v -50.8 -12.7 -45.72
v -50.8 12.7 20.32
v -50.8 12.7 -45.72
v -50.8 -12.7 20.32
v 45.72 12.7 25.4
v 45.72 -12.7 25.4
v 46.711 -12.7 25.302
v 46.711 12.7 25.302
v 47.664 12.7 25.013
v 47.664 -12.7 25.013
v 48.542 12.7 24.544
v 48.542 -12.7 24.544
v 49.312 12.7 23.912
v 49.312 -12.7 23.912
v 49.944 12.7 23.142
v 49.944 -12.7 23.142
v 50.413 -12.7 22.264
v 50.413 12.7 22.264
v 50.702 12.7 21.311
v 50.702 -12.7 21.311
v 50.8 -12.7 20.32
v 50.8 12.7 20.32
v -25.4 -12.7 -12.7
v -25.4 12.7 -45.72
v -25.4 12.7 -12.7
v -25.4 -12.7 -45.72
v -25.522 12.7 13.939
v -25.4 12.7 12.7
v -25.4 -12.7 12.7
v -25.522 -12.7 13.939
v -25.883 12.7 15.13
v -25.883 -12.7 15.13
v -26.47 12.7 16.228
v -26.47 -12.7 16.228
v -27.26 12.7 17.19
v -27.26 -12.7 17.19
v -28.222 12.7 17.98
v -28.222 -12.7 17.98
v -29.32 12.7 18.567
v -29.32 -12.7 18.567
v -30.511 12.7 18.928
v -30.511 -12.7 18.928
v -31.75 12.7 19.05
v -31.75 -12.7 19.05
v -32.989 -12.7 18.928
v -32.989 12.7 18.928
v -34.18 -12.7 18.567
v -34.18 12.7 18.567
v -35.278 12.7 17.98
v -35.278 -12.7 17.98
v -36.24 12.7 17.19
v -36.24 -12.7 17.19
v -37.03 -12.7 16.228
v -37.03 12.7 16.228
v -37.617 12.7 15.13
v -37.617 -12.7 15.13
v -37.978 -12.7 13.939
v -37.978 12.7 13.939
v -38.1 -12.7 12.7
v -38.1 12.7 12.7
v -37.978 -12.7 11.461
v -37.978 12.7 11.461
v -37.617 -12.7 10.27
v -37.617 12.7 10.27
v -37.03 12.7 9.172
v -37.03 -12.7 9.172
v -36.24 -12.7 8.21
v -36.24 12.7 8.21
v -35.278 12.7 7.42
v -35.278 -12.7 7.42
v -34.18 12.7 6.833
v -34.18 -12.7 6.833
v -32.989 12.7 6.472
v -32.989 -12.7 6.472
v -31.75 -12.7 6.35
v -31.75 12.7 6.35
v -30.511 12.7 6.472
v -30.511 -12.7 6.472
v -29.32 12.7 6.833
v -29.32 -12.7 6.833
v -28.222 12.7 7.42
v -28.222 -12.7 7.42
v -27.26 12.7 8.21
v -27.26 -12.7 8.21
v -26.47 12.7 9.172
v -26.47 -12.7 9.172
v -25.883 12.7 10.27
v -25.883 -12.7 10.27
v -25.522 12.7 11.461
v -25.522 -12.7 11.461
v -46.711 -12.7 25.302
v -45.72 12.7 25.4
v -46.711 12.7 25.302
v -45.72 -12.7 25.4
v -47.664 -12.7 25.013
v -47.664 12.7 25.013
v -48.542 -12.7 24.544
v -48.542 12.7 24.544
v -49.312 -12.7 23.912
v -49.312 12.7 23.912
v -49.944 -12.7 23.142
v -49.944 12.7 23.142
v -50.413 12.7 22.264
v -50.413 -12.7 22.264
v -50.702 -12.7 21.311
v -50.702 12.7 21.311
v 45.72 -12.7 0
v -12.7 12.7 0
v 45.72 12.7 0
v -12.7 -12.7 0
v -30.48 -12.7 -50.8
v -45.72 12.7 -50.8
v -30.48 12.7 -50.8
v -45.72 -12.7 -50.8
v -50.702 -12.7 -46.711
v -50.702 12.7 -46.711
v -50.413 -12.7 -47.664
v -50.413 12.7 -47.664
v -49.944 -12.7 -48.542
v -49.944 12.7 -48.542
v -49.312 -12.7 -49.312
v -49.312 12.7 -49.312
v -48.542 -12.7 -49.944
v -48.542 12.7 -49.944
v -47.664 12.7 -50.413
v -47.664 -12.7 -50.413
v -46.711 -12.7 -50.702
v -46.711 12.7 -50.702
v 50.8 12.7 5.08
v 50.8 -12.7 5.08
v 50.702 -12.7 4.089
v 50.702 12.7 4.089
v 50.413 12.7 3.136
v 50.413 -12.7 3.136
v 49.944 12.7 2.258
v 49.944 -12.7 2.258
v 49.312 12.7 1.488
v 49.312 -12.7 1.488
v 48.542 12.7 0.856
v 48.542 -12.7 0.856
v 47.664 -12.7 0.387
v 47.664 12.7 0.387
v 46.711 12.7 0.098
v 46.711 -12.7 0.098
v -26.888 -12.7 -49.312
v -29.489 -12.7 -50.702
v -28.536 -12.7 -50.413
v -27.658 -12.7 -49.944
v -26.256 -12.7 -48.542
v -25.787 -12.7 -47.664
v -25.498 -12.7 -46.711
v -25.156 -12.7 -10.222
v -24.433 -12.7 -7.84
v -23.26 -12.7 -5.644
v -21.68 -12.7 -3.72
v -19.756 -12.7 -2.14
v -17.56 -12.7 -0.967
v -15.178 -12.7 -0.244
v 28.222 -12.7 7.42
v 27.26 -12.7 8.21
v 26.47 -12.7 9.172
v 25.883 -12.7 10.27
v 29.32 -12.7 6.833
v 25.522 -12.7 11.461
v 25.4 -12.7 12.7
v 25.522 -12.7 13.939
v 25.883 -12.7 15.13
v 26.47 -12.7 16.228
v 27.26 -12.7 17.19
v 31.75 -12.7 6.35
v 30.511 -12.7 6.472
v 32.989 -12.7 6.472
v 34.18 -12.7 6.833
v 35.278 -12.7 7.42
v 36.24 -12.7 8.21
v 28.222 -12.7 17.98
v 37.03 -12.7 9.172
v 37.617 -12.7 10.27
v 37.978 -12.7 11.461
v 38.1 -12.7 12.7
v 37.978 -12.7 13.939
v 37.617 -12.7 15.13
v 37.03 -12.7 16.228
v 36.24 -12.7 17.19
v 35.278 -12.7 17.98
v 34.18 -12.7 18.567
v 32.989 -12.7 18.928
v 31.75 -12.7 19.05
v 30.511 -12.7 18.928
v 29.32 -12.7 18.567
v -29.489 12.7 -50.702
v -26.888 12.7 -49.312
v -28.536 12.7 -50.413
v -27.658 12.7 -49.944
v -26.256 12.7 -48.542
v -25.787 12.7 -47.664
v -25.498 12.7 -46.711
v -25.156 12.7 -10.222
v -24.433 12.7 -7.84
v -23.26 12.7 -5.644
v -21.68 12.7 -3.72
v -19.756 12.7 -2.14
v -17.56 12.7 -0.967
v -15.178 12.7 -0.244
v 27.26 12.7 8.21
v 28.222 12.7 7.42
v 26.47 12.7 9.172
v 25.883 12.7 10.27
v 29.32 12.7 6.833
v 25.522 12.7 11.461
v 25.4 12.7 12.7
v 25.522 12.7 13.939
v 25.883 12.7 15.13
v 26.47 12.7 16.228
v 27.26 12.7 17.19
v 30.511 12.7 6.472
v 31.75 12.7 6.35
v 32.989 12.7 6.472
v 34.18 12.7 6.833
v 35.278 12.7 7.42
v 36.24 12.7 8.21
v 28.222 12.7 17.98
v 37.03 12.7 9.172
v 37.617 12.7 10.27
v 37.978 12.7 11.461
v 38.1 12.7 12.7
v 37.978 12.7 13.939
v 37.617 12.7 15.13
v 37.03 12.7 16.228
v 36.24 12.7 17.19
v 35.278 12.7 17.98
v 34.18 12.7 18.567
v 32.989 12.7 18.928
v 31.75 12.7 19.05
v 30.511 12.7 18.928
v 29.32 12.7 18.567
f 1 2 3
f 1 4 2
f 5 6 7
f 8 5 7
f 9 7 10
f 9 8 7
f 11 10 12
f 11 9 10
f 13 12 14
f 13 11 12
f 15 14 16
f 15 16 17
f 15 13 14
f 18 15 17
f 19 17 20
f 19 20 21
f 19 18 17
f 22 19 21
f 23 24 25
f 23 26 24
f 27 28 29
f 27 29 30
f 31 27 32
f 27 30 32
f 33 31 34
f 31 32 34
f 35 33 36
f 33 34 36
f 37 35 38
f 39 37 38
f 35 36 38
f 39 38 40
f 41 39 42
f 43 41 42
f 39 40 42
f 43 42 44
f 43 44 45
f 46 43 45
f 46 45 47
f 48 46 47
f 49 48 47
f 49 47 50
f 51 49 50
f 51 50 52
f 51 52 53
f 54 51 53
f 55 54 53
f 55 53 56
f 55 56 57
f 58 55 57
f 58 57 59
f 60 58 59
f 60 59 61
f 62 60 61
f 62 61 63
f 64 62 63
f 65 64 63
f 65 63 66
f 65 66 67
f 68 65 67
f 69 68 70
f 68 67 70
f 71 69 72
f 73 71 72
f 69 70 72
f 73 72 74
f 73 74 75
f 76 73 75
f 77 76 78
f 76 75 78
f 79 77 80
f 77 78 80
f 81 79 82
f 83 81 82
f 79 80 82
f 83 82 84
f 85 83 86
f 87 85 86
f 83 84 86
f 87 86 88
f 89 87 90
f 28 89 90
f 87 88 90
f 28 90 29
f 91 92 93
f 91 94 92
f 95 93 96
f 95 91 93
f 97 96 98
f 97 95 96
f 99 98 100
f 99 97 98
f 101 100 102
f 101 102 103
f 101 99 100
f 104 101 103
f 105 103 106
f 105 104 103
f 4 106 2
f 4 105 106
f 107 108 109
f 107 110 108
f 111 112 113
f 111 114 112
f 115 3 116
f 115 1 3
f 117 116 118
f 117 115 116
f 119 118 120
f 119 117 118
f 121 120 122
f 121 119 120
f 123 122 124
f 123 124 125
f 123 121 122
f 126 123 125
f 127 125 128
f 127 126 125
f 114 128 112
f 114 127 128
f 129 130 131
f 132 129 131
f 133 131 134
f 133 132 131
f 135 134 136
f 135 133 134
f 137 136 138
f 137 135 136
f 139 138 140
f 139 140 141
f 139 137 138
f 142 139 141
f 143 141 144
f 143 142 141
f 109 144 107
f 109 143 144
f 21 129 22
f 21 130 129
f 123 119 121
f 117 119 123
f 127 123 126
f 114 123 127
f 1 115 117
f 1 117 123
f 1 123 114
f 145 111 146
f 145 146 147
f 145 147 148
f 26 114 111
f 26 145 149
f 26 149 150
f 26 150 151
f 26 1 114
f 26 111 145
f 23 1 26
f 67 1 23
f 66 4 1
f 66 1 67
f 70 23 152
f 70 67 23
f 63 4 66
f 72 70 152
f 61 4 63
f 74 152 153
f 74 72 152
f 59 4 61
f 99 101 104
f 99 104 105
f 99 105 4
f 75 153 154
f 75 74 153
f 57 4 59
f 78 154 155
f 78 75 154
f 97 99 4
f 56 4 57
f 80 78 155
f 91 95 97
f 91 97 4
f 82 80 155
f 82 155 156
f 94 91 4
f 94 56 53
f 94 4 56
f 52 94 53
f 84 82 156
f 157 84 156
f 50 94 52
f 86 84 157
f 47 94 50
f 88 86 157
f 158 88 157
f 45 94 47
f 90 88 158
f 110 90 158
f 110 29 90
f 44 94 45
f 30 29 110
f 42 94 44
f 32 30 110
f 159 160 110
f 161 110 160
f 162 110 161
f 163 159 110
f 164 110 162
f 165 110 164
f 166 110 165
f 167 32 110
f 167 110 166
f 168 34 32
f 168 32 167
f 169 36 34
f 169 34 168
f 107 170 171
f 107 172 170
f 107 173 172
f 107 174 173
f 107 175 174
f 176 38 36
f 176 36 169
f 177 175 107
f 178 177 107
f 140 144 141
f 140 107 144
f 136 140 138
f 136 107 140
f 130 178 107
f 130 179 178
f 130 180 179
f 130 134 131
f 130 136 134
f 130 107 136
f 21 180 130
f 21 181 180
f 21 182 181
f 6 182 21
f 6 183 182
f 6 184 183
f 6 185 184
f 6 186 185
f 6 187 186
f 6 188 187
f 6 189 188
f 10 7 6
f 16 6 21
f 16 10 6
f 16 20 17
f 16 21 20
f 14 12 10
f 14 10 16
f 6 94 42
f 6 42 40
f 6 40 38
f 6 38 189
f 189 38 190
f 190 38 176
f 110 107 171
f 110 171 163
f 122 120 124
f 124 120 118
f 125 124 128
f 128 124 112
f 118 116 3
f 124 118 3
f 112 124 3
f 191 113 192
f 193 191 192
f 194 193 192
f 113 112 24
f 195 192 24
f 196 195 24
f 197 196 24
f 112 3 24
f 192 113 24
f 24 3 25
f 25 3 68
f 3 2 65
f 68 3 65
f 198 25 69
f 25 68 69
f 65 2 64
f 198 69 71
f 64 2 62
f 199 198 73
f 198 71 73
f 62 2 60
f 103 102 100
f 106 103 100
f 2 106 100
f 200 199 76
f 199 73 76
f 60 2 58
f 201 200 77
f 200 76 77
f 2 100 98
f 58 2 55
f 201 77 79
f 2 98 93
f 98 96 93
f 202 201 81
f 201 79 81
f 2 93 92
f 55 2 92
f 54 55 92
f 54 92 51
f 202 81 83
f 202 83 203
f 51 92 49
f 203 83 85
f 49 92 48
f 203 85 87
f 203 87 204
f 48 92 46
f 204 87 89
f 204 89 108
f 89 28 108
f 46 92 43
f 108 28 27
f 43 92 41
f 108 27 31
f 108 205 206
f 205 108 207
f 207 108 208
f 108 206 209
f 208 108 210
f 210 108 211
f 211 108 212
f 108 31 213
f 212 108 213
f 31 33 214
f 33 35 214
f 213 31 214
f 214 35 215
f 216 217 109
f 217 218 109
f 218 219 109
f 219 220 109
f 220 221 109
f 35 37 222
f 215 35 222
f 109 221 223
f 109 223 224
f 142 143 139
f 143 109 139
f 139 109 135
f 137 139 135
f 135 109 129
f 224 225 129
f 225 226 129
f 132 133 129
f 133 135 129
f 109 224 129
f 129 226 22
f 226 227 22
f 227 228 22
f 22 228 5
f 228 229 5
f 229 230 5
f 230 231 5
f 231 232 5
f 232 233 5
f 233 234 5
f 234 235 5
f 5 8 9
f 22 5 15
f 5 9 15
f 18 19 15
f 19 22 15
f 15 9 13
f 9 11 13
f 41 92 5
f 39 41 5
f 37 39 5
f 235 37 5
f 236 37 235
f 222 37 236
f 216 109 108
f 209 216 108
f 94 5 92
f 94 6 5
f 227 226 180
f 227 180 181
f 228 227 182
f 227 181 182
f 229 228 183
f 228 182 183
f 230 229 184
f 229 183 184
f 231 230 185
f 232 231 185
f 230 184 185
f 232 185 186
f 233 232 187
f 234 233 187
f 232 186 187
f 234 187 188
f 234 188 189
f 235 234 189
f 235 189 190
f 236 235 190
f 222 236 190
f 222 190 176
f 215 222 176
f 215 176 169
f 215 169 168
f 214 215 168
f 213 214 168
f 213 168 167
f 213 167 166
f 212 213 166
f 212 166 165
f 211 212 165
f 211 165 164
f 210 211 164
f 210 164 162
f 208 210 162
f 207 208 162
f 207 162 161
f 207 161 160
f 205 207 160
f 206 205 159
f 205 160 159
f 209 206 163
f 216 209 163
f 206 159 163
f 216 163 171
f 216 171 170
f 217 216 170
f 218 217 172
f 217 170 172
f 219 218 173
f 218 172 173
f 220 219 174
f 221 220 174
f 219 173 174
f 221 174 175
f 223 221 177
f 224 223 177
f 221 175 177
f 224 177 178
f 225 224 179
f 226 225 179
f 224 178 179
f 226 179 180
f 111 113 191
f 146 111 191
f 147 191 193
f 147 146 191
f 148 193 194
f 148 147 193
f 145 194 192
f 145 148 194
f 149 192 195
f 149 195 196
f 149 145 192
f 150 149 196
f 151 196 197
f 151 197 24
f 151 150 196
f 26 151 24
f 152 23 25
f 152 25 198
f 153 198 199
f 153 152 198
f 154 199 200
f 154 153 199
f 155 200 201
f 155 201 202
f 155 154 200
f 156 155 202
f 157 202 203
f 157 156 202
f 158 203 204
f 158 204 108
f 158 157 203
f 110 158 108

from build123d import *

# Parameters (mm, degrees)
F1_DEPTH = 12.7
F2_R     = 6.35
F3_DEPTH = 25.401
F4_R     = 5.08


with BuildPart() as f1:
    # F0 (on Front) → F1 (new body, symmetric)
    with BuildSketch(Plane.XZ):
        with BuildLine():
            Line((50.8, 25.4), (-50.8, 25.4))
            Line((-50.8, 25.4), (-50.8, -50.8))
            Line((-50.8, -50.8), (-25.4, -50.8))
            Line((-25.4, -50.8), (-25.4, -12.7))
            ThreePointArc((-25.4, -12.7), (-21.680256, -3.719744), (-12.7, 0))
            Line((-12.7, 0), (50.8, 0))
            Line((50.8, 0), (50.8, 25.4))
        make_face()
    extrude(amount=F1_DEPTH, both=True)

    # F2 (on face) → F3 (cut, through all)
    with BuildSketch(Plane.XZ.offset(12.7)):
        with Locations((-31.75, 12.7)):
            Circle(F2_R)
        with Locations((31.75, 12.7)):
            Circle(F2_R)
    extrude(amount=-F3_DEPTH, mode=Mode.SUBTRACT)

    # F4
    f4_edges = [f1.edges().sort_by_distance(p)[0] for p in [
        (50.8, 0, 25.4),
        (50.8, 0, 0),
        (-25.4, 0, -50.8),
        (-50.8, 0, 25.4),
        (-50.8, 0, -50.8),
    ]]
    fillet(f4_edges, radius=F4_R)


solid = f1.part
